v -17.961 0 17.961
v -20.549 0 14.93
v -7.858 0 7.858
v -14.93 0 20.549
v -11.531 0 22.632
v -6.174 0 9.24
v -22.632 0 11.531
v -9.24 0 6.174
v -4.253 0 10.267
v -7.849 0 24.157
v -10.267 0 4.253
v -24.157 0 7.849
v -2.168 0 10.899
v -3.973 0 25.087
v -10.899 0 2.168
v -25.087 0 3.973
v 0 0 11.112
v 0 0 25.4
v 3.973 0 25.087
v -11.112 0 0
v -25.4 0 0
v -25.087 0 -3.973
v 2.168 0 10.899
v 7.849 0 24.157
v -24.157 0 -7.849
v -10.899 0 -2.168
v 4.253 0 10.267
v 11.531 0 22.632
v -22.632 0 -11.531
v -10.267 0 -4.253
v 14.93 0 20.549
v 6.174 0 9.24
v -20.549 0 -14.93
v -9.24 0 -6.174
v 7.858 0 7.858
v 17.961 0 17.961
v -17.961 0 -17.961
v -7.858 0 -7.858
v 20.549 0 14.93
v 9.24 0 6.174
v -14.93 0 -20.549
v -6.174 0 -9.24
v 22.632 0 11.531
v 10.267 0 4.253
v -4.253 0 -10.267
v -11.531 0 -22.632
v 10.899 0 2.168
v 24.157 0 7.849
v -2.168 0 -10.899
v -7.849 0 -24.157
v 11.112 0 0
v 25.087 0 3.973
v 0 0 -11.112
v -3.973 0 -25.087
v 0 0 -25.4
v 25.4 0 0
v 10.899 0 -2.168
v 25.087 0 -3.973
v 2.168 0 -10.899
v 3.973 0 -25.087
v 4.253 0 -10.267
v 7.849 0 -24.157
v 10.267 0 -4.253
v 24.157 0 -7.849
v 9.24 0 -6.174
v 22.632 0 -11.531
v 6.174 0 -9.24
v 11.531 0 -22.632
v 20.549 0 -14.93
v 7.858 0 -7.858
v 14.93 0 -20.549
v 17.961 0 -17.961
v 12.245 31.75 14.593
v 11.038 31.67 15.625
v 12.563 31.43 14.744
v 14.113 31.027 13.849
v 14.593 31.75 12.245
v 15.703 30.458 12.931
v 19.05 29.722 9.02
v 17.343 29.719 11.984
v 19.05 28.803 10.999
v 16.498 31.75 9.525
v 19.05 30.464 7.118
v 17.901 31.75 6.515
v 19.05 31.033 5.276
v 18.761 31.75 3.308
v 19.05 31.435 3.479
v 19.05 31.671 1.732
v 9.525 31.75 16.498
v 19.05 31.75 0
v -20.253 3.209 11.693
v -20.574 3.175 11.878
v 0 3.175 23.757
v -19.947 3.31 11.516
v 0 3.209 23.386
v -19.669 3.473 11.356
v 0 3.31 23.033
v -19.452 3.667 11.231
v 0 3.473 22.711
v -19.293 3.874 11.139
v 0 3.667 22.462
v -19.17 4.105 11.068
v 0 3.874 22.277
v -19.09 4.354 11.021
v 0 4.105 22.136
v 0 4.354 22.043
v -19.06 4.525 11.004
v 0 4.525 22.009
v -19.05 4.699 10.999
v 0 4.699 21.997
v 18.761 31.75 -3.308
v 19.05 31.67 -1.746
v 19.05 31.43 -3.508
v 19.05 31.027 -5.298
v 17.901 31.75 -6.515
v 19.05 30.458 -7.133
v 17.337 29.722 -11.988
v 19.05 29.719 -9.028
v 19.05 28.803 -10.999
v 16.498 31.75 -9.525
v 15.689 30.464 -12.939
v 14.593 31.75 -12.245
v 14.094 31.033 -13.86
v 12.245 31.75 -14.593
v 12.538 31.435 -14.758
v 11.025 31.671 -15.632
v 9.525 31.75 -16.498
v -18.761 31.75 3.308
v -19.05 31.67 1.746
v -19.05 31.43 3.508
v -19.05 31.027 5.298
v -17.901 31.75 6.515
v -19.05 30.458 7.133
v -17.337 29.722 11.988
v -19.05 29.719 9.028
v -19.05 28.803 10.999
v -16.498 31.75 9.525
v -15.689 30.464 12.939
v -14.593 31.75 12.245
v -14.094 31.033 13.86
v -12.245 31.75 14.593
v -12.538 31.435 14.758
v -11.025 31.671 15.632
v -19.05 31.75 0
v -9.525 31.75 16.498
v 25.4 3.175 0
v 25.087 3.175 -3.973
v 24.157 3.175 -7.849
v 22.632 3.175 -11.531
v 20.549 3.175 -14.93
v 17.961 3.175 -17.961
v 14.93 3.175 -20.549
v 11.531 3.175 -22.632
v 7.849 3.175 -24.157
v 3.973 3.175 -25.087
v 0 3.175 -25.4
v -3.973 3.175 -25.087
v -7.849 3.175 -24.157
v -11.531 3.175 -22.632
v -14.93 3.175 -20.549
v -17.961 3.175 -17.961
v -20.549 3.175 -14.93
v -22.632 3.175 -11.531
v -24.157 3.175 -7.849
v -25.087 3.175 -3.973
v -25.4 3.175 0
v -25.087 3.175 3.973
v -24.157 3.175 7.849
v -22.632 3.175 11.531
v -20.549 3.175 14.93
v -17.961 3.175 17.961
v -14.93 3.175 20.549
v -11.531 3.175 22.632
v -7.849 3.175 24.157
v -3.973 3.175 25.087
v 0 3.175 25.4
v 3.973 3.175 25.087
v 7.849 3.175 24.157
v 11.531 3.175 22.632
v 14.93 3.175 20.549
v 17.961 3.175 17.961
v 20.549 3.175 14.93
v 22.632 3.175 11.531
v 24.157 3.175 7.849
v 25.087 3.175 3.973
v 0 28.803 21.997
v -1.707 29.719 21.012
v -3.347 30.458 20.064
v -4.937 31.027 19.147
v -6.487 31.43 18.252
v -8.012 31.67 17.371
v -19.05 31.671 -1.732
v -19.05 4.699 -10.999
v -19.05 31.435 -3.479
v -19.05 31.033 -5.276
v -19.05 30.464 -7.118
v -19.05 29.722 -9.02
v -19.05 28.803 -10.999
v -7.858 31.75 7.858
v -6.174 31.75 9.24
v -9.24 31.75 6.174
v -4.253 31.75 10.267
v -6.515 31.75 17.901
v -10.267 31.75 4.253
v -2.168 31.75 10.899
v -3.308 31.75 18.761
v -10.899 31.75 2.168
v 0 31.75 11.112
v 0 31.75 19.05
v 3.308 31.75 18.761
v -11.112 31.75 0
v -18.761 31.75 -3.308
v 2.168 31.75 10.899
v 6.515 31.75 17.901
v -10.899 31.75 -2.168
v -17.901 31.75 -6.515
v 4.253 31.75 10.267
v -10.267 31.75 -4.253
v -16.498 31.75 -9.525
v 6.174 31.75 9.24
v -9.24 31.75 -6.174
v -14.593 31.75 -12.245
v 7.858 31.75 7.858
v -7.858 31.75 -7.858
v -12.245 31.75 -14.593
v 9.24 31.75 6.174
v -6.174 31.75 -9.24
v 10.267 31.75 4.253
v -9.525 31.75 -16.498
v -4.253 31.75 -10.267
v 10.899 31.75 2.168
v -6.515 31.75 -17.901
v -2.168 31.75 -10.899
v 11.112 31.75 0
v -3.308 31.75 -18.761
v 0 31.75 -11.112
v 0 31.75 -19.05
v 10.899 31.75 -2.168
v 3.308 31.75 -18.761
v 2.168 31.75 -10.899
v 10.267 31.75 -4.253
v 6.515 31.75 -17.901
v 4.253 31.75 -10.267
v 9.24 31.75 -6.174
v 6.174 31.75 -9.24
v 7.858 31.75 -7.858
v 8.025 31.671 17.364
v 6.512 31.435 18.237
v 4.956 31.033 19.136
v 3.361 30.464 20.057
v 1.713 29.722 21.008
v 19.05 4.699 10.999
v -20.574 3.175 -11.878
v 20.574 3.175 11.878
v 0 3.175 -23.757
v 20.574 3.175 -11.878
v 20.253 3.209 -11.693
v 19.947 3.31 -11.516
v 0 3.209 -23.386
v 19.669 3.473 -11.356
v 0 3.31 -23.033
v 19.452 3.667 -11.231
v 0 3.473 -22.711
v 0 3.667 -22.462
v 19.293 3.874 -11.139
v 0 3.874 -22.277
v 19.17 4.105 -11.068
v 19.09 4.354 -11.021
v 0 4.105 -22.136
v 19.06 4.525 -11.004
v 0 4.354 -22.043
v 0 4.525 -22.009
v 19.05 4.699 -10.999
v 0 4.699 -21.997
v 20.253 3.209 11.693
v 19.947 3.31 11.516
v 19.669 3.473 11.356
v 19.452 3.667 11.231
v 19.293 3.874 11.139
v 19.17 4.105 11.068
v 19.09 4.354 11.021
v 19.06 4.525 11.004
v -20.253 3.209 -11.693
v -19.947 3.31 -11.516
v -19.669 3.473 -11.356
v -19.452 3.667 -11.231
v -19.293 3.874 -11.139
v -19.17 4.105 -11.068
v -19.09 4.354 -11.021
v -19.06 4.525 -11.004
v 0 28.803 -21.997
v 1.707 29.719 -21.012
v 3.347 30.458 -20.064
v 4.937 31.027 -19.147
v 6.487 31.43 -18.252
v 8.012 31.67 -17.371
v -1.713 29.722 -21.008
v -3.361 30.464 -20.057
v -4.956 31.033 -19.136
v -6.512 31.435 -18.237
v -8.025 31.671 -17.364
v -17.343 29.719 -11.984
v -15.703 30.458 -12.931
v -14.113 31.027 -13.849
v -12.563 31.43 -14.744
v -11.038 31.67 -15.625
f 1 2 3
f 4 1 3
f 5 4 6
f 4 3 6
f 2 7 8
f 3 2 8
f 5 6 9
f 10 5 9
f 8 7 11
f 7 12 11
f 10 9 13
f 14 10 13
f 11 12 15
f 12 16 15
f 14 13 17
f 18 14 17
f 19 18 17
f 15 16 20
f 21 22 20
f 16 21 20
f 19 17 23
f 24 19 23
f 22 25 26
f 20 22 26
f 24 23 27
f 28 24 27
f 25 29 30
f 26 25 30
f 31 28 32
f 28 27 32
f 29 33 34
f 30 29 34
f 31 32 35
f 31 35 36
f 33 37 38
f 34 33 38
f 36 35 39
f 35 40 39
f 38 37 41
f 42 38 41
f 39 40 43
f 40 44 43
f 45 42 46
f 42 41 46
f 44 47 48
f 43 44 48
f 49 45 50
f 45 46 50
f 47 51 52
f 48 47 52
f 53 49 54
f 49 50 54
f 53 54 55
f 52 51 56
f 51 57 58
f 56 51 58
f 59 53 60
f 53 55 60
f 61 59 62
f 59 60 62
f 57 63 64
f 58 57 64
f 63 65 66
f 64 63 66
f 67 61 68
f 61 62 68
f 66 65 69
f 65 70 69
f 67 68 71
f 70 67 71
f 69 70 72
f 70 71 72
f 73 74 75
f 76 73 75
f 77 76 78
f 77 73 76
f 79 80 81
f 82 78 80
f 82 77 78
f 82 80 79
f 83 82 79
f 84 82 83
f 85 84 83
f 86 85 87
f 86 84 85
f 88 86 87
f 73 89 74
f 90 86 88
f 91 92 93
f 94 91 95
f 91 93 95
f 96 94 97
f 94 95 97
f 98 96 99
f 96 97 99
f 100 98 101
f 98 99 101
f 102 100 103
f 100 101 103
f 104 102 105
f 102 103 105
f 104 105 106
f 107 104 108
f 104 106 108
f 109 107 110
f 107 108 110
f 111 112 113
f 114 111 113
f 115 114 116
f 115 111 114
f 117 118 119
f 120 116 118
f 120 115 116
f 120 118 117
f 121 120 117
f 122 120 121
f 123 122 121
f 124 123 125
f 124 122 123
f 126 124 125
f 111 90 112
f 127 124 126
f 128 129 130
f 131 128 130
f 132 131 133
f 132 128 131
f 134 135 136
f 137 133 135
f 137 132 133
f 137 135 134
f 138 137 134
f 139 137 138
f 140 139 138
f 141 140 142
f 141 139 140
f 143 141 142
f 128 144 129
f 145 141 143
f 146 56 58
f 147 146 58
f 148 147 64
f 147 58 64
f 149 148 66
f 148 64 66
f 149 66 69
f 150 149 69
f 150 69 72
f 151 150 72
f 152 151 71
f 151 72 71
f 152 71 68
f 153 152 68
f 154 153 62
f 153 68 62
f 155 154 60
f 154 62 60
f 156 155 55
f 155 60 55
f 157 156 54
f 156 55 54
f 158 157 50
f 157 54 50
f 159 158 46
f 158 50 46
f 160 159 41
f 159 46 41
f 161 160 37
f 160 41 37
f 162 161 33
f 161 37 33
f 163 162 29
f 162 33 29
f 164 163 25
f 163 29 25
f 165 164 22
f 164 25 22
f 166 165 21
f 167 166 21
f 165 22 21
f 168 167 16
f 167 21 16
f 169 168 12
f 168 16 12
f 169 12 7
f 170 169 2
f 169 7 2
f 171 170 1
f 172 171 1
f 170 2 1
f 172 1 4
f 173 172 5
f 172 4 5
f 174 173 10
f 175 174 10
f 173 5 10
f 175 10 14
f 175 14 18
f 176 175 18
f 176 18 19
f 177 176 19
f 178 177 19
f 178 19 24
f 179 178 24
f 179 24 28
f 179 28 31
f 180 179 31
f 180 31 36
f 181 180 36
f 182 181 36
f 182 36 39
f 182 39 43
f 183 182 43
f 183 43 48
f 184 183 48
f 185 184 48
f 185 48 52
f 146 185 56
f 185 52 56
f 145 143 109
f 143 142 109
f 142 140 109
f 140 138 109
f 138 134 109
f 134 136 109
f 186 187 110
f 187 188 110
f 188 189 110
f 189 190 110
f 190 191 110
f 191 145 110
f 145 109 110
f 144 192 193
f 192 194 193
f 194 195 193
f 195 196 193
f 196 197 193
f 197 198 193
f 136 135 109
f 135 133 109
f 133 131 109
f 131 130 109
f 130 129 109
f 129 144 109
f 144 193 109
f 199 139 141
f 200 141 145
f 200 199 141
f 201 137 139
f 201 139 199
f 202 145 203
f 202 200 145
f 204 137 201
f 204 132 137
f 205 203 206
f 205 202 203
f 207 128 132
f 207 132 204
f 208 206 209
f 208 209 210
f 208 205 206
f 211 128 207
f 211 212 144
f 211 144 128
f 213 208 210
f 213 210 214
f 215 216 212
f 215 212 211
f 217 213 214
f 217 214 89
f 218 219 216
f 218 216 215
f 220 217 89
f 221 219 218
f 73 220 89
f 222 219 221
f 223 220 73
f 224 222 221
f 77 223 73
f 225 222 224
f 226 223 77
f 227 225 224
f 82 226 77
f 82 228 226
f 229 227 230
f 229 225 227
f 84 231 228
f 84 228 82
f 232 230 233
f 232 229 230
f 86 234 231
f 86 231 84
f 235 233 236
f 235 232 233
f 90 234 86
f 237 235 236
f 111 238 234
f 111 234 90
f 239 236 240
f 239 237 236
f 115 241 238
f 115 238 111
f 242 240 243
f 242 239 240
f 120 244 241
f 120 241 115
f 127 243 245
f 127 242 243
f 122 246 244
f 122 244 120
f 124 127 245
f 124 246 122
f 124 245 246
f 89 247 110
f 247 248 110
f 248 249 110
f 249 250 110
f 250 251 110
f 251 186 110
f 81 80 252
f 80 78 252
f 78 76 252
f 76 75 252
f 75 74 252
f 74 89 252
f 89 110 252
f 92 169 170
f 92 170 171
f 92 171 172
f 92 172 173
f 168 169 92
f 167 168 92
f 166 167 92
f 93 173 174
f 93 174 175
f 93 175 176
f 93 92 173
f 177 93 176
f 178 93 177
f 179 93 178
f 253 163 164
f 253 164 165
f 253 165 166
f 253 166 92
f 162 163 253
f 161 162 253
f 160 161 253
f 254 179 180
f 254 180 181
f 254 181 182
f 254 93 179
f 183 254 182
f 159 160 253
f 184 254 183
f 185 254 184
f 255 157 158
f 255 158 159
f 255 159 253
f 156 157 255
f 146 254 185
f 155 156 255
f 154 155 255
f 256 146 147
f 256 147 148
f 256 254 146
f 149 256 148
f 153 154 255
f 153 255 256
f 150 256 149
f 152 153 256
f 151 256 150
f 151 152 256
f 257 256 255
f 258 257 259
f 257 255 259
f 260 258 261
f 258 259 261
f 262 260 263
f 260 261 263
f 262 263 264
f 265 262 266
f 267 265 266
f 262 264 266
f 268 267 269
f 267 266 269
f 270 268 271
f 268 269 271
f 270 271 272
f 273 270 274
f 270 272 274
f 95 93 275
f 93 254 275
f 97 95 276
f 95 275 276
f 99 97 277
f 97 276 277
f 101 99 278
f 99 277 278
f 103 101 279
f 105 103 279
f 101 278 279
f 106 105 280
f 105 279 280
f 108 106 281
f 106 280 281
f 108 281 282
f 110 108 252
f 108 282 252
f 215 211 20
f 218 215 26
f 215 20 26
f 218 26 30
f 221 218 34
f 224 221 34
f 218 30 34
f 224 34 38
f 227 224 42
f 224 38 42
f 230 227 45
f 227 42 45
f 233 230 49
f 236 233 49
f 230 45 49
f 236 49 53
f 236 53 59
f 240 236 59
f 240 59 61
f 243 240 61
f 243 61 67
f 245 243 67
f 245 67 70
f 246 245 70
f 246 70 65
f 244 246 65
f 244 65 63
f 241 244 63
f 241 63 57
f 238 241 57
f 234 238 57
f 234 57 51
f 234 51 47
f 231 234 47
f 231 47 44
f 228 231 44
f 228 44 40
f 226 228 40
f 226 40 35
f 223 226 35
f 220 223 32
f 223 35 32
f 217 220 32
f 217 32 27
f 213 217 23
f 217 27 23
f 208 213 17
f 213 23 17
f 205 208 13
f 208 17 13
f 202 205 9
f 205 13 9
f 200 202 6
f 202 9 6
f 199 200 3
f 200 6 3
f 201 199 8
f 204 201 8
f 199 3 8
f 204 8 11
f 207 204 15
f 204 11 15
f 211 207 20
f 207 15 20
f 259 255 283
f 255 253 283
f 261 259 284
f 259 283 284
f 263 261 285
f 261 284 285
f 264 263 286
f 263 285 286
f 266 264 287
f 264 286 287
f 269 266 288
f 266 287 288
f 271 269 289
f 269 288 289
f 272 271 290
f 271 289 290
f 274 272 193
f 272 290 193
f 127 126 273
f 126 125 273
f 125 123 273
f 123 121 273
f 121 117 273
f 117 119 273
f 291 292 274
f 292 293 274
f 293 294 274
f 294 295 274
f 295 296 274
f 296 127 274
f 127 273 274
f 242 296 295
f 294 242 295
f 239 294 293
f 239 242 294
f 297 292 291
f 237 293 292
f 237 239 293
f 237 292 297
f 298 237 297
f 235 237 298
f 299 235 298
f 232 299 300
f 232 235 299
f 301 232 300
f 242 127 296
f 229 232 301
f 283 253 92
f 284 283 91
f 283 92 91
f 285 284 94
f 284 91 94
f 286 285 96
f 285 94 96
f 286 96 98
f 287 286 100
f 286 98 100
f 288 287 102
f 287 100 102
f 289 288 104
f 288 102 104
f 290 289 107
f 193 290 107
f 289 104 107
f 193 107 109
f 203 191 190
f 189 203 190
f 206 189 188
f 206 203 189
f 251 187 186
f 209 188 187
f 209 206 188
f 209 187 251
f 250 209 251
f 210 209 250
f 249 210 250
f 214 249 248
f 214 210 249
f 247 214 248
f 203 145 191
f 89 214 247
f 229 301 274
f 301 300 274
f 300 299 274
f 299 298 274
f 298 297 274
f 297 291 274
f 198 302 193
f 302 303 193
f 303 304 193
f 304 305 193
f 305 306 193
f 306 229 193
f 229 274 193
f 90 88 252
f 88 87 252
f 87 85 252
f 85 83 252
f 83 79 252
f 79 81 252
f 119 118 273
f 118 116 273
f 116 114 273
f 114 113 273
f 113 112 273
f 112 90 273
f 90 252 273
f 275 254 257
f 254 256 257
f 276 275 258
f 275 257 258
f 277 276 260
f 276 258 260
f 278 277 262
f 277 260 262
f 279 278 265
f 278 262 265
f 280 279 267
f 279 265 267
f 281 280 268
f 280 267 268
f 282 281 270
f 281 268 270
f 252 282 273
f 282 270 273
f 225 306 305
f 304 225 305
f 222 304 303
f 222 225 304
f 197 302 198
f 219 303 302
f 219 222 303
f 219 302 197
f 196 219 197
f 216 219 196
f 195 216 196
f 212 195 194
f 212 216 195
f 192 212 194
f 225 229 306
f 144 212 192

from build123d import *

# Parameters (mm, degrees)
SKETCH2_R                = 25.4
BOSS_EXTRUDE1_DEPTH      = 3.175
BOSS_EXTRUDE2_DEPTH      = 28.575
F_1_8_TAPPED_HOLE1_D     = 22.225
F_1_8_TAPPED_HOLE1_DEPTH = 31.75
FILLET1_R                = 1.524


with BuildPart() as part:
    # Sketch2 → Boss-Extrude1 (new body)
    with BuildSketch(Plane(origin=(0, 0, 0), x_dir=(1, 0, 0), z_dir=(0, 1, 0))):
        Circle(SKETCH2_R)
    extrude(amount=BOSS_EXTRUDE1_DEPTH)

    # Sketch3 → Boss-Extrude2 (add)
    with BuildSketch(Plane(origin=(0, 3.175, 0), x_dir=(1, 0, 0), z_dir=(0, 1, 0))):
        Polygon((0, 21.997045256), (-19.05, 10.998522628), (-19.05, -10.998522628), (0, -21.997045256), (19.05, -10.998522628), (19.05, 10.998522628), align=None)
    extrude(amount=BOSS_EXTRUDE2_DEPTH)

    # 1-8 Tapped Hole1
    with Locations(Plane(origin=(0, 31.75, 0), x_dir=(1, 0, 0), z_dir=(0, 1, 0))):
        with Locations((0, 0)):
            Hole(F_1_8_TAPPED_HOLE1_D / 2, depth=F_1_8_TAPPED_HOLE1_DEPTH)

    # Cut-Sweep1: sweep along a path in Sketch7
    with BuildLine(Plane(origin=(0, 31.75, 0), x_dir=(1, 0, 0), z_dir=(0, 1, 0))) as cut_sweep1_path:
        CenterArc((0, 0), 19.05, 0, 360)
    # Sketch8 → Cut-Sweep1 (sweep, cut)
    with BuildSketch(Plane(origin=(0, 0, 0), x_dir=(0, 0, -1), z_dir=(1, 0, 0))):
        Polygon((-21.997045256, 28.802954744), (-21.997045256, 31.75), (-19.05, 31.75), align=None)
    sweep(path=cut_sweep1_path.line, mode=Mode.SUBTRACT)

    # Fillet1
    fillet1_edges = [part.edges().sort_by_distance(p)[0] for p in [
        (9.525, 3.175, -16.497783942),
        (-9.525, 3.175, -16.497783942),
        (-19.05, 3.175, 0),
        (-9.525, 3.175, 16.497783942),
        (9.525, 3.175, 16.497783942),
        (19.05, 3.175, 0),
    ]]
    fillet(fillet1_edges, radius=FILLET1_R)


solid = part.part
